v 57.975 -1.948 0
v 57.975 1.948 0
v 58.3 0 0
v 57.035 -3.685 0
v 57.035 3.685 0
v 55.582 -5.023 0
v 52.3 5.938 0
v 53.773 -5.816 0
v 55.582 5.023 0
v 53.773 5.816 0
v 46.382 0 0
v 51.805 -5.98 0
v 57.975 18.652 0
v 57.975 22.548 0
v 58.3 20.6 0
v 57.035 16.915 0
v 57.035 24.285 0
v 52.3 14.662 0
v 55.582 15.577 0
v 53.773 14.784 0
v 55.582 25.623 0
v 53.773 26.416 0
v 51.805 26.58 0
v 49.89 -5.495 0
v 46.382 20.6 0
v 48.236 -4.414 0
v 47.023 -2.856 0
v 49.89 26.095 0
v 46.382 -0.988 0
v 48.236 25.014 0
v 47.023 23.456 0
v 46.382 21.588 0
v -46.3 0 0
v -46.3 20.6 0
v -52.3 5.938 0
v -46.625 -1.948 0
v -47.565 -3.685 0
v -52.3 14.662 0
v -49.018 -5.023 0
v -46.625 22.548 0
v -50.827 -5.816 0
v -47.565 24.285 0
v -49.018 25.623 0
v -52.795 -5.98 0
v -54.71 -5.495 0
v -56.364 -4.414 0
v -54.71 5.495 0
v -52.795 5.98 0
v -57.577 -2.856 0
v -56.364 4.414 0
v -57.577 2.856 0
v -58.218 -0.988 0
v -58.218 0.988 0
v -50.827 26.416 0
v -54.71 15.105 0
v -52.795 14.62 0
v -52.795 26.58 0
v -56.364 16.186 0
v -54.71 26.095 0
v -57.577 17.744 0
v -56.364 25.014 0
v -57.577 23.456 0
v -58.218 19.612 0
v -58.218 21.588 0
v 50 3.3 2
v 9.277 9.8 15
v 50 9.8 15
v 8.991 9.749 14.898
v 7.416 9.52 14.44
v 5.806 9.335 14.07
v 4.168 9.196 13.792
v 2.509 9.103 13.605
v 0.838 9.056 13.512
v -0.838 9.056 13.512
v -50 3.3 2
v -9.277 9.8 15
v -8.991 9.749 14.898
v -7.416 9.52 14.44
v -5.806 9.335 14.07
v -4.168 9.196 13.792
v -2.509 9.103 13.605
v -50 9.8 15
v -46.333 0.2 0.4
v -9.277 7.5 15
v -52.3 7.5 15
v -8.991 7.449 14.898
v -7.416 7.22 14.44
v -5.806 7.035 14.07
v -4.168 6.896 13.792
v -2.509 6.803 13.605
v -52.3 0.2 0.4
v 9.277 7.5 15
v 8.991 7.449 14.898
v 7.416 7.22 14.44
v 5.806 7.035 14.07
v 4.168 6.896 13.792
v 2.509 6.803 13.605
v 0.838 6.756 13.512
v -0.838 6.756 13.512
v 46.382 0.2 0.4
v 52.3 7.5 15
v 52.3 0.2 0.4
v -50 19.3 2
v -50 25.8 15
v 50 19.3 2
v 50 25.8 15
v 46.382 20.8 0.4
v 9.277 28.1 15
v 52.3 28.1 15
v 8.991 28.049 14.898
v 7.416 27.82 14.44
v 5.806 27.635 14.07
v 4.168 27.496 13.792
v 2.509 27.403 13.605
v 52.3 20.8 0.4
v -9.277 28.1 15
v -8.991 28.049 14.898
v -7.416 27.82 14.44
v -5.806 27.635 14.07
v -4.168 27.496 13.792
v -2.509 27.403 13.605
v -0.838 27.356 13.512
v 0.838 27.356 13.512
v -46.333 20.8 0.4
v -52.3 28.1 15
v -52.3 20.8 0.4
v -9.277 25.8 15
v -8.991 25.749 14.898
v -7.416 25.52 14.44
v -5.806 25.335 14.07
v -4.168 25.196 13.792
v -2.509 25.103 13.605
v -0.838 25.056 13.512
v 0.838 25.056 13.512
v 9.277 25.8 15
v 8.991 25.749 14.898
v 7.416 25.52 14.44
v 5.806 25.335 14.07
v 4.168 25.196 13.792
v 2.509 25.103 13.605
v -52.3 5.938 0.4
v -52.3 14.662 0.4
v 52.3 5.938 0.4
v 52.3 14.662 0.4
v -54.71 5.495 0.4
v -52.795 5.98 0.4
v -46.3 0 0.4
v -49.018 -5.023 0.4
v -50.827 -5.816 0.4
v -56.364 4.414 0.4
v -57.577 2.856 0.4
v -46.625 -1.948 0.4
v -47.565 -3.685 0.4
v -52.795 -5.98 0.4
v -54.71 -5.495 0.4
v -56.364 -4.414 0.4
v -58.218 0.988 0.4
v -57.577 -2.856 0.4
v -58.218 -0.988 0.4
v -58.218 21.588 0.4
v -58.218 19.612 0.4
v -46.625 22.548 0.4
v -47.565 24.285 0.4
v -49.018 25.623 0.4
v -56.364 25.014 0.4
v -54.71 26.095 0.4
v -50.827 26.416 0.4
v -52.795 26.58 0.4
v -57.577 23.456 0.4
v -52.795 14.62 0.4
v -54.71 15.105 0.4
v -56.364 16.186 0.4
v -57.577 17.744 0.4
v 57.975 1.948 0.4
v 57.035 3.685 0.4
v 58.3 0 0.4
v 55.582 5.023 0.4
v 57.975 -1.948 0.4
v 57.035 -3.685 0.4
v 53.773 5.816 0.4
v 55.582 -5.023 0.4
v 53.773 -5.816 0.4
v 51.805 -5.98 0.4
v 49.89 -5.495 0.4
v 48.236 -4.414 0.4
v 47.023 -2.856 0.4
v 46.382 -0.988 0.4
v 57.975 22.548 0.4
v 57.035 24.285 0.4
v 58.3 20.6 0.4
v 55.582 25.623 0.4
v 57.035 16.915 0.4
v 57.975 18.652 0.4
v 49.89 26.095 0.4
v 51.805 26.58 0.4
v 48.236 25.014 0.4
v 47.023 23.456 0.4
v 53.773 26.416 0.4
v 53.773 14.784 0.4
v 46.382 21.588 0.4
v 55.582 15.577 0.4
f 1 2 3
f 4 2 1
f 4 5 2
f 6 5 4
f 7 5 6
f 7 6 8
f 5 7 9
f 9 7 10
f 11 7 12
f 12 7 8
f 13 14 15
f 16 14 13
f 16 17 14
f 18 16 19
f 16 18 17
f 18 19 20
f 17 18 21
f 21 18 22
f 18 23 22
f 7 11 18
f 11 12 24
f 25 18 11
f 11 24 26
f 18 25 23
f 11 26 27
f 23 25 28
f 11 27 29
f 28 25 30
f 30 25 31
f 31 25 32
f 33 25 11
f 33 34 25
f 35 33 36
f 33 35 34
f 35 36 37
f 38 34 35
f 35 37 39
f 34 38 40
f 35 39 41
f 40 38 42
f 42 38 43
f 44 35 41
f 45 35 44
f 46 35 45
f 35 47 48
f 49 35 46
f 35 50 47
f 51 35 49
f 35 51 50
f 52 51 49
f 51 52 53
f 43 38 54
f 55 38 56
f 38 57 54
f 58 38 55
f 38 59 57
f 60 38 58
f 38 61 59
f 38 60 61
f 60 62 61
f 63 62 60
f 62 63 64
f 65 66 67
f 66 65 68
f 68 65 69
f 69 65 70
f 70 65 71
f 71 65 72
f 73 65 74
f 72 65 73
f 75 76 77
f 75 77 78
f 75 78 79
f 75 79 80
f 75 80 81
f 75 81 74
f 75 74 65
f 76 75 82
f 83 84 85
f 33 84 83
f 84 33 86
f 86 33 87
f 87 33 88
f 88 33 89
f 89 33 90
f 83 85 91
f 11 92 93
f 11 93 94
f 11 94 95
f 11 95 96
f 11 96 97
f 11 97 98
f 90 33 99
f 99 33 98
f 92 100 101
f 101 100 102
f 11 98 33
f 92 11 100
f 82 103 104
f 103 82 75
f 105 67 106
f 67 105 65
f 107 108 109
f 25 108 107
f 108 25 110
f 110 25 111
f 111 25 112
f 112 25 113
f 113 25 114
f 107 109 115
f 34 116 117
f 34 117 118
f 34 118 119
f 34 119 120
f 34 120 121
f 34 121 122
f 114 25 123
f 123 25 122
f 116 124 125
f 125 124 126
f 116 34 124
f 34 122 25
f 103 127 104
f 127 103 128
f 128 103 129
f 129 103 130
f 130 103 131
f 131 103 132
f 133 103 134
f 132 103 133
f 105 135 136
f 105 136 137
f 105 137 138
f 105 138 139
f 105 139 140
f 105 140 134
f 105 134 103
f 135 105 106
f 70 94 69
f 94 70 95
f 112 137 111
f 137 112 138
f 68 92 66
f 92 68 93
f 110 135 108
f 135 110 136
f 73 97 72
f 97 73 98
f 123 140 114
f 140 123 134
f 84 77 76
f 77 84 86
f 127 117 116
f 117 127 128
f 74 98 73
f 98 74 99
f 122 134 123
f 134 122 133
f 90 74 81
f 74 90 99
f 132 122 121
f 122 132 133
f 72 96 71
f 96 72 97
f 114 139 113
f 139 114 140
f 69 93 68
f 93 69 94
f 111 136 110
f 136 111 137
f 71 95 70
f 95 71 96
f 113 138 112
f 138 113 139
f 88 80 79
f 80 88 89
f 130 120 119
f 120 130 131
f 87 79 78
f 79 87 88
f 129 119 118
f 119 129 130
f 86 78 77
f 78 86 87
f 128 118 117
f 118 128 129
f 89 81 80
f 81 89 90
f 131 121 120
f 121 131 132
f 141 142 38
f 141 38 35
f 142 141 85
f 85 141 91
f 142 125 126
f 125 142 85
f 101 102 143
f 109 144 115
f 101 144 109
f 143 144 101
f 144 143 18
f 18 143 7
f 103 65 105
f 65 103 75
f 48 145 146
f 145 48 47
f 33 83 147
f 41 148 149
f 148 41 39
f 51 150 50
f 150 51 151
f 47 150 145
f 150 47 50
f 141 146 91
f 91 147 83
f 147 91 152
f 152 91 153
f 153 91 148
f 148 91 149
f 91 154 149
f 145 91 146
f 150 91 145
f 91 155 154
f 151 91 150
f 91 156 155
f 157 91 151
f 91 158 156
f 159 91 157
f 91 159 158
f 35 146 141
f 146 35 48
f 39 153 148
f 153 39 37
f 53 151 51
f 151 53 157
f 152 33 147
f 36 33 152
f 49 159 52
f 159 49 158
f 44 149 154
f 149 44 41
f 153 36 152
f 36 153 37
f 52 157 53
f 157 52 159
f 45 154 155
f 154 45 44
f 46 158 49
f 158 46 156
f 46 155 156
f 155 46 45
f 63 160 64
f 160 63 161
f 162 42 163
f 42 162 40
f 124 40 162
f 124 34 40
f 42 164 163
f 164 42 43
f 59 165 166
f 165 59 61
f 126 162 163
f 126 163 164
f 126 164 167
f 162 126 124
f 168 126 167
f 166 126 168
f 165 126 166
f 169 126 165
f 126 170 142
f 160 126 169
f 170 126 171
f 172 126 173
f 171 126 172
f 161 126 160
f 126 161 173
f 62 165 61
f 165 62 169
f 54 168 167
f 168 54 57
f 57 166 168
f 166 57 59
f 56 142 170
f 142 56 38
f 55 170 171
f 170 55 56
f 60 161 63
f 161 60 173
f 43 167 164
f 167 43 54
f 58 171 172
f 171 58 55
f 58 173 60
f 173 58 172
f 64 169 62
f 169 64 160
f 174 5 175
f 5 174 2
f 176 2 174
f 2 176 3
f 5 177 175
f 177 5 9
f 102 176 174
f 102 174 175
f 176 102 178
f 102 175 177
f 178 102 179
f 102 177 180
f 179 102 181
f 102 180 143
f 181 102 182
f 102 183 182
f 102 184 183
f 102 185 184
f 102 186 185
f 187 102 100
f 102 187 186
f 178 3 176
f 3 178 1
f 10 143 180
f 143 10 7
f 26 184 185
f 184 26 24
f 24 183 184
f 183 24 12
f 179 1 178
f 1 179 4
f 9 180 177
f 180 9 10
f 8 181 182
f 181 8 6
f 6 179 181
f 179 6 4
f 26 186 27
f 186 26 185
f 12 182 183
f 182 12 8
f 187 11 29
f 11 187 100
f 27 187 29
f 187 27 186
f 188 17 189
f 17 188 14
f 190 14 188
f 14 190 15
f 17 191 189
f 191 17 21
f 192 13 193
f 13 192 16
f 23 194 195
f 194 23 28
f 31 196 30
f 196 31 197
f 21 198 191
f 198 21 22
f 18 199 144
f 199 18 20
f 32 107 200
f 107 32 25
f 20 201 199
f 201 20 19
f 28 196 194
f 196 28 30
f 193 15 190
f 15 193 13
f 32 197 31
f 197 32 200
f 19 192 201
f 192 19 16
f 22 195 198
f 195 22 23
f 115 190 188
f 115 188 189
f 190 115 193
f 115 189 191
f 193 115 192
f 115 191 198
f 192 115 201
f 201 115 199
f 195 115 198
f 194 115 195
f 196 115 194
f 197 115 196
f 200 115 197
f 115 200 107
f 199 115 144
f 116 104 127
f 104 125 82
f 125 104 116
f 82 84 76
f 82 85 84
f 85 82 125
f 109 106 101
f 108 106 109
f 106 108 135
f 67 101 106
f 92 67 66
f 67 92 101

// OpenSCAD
eps = 0.0001;

card_h = 100;

height = 42;
plate_t = 2;
tilt_offs = height/2;
gap = 16;
wall = 2.3;

chambers = 1;

module slash() {
  hull()
    for (yz = [[0, 0], [tilt_offs, height]])
      translate([-card_h/2, yz[0], yz[1]])
        cube([card_h, wall, eps]);
}

module slashes() {
  for (i = [0:chambers])
    translate([0, i*(gap+wall), 0])
      slash();
}

module barrel() {
  roundoff = 10;
  d = card_h*0.48;
  long = 400;
  
  translate([0, 0, height-roundoff+0.7]) {
    translate([0, long/2, 0])
      rotate([90, 0, 0])
        scale([1, 0.8, 1])
          cylinder($fn=90, h=long, d=d);
    
    difference() {
      translate([0, 0, d/2])
        cube([d+2*roundoff, long, d], center=true);
      
      for (a = [-1, 1])
        scale([a, 1, 1])
          translate([-d/2-roundoff, long/2, 0])
            rotate([90, 0, 0])
              cylinder($fn=90, h=long, r=roundoff);
    }
  }
}

module walls() {
  for (a = [-1, 1]) {
    scale([a, 1, 1]) {
      difference() {
        translate([wall, 0, 0])
          hull()
            slashes();
        translate([0, -1, -1])
          scale([1, 2, 2])
            hull()
              slashes();
      }
    }
  }
}

module plate() {
  intersection() {
    hull()
      slashes();
    cube([1000, 1000, plate_t*2], center=true);
  }
}

module tags() {
  for (x = (card_h/2 + wall) * [-1, 1], y = [0, chambers*(gap+wall)+wall])
    translate([x, y])
      cylinder(r=6, h=0.4);
}

module piece() {
  difference() {
    slashes();
    barrel();
  }
  walls();
  plate();
  tags();
}

intersection() {
  piece();
  cube([1000, 1000, 30], center=true);
}
